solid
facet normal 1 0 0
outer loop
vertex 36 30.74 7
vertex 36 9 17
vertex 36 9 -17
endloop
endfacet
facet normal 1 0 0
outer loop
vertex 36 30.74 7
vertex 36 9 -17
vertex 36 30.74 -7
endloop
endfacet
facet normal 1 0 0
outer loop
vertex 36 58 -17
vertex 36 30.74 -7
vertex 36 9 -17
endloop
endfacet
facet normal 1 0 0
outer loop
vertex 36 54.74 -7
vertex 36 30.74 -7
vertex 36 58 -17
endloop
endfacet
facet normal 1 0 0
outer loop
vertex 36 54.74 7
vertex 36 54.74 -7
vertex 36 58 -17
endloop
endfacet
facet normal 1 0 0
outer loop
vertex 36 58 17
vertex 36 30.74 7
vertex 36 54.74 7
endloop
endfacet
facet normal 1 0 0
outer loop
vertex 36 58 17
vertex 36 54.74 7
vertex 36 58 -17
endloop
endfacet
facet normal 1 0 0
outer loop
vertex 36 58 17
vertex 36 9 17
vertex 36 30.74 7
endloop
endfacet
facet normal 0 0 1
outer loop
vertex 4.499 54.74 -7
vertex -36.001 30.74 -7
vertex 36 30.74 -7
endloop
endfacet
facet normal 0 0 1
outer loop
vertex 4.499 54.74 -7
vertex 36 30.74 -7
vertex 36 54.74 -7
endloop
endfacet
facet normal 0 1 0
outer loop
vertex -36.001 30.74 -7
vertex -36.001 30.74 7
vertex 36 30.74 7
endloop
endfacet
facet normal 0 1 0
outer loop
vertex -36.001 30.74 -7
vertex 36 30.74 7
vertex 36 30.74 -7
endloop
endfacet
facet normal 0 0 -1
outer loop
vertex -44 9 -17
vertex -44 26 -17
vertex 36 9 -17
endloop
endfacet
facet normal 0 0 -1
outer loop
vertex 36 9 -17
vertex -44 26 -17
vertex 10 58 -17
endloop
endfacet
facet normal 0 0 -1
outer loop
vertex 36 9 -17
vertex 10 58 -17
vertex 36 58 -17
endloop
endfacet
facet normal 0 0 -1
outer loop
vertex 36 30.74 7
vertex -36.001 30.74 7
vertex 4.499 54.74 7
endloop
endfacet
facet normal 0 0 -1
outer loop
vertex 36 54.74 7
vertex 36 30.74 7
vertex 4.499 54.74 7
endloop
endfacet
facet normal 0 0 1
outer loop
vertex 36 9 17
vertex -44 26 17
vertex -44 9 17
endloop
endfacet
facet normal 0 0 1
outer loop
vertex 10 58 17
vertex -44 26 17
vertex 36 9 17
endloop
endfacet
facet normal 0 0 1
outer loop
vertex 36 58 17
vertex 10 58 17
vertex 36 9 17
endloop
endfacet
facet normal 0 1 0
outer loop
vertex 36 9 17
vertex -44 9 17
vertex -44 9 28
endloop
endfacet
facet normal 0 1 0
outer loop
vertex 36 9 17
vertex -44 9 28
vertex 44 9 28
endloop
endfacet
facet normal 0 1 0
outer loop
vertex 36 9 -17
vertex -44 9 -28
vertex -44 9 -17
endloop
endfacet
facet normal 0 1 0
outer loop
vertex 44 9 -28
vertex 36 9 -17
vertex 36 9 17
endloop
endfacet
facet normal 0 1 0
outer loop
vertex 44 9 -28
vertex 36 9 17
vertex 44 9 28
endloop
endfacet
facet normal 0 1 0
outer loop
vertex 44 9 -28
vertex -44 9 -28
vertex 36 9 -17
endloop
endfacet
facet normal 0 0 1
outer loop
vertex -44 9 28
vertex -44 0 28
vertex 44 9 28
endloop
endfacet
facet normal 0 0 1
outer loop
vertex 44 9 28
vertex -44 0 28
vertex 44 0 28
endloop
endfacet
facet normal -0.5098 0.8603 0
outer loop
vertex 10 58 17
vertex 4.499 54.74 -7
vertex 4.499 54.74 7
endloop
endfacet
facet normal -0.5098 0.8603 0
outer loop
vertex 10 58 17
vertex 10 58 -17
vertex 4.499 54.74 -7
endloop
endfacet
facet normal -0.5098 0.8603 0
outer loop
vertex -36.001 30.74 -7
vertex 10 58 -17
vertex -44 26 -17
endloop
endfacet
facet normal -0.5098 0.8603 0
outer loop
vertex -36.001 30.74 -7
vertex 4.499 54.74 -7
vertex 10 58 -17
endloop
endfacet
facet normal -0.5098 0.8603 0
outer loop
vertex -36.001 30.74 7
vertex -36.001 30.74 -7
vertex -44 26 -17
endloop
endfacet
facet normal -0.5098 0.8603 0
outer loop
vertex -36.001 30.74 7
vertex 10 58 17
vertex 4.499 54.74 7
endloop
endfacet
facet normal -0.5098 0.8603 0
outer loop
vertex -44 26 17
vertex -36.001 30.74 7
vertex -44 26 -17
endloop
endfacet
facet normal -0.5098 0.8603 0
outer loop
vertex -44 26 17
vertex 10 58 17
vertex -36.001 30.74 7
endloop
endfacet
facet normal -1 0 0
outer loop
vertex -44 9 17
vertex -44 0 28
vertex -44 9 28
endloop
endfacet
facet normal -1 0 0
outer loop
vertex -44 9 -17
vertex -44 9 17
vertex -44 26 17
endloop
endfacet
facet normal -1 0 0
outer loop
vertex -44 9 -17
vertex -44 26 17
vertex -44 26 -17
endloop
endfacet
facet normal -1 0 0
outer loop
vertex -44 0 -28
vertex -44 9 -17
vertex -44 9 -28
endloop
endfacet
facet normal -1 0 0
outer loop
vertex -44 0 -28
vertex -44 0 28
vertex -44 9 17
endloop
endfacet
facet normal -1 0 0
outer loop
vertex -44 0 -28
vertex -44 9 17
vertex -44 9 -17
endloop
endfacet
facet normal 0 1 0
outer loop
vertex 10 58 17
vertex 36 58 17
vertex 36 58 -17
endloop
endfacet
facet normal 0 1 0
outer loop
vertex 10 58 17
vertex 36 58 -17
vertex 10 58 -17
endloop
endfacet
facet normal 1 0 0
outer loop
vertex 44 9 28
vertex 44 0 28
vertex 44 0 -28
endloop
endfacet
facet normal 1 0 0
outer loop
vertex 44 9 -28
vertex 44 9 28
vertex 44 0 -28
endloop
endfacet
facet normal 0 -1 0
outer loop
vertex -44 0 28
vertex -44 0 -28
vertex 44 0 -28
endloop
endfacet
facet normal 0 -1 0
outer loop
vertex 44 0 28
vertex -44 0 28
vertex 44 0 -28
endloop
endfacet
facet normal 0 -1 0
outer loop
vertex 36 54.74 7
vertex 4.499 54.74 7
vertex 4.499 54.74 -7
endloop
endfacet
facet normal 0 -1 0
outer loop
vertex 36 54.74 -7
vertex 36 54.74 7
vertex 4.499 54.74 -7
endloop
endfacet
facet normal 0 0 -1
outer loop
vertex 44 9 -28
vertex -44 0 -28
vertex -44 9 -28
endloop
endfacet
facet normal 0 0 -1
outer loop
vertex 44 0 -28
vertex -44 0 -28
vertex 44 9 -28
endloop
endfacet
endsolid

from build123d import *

# Parameters (mm, degrees)
SKETCH1_W           = 88
SKETCH1_H           = 56
BOSS_EXTRUDE1_DEPTH = 9
BOSS_EXTRUDE2_DEPTH = 34
SKETCH3_W           = 14
SKETCH3_H           = 24
CUT_EXTRUDE1_DEPTH  = 103.703456612


with BuildPart() as part:
    # Sketch1 → Boss-Extrude1 (new body)
    with BuildSketch(Plane(origin=(0, 0, 0), x_dir=(1, 0, 0), z_dir=(0, 1, 0))):
        Rectangle(SKETCH1_W, SKETCH1_H)
    extrude(amount=BOSS_EXTRUDE1_DEPTH)

    # Sketch2 → Boss-Extrude2 (add)
    with BuildSketch(Plane.XY.offset(17)):
        Polygon((-44, 9), (36, 9), (36, 58), (10, 58), (-44, 26), align=None)
    extrude(amount=-BOSS_EXTRUDE2_DEPTH)

    # Sketch3 → Cut-Extrude1 (cut, through all)
    with BuildSketch(Plane(origin=(36, 0, 0), x_dir=(0, 0, -1), z_dir=(1, 0, 0))):
        with Locations((0, 42.74)):
            Rectangle(SKETCH3_W, SKETCH3_H)
    extrude(amount=-CUT_EXTRUDE1_DEPTH, mode=Mode.SUBTRACT)


solid = part.part
